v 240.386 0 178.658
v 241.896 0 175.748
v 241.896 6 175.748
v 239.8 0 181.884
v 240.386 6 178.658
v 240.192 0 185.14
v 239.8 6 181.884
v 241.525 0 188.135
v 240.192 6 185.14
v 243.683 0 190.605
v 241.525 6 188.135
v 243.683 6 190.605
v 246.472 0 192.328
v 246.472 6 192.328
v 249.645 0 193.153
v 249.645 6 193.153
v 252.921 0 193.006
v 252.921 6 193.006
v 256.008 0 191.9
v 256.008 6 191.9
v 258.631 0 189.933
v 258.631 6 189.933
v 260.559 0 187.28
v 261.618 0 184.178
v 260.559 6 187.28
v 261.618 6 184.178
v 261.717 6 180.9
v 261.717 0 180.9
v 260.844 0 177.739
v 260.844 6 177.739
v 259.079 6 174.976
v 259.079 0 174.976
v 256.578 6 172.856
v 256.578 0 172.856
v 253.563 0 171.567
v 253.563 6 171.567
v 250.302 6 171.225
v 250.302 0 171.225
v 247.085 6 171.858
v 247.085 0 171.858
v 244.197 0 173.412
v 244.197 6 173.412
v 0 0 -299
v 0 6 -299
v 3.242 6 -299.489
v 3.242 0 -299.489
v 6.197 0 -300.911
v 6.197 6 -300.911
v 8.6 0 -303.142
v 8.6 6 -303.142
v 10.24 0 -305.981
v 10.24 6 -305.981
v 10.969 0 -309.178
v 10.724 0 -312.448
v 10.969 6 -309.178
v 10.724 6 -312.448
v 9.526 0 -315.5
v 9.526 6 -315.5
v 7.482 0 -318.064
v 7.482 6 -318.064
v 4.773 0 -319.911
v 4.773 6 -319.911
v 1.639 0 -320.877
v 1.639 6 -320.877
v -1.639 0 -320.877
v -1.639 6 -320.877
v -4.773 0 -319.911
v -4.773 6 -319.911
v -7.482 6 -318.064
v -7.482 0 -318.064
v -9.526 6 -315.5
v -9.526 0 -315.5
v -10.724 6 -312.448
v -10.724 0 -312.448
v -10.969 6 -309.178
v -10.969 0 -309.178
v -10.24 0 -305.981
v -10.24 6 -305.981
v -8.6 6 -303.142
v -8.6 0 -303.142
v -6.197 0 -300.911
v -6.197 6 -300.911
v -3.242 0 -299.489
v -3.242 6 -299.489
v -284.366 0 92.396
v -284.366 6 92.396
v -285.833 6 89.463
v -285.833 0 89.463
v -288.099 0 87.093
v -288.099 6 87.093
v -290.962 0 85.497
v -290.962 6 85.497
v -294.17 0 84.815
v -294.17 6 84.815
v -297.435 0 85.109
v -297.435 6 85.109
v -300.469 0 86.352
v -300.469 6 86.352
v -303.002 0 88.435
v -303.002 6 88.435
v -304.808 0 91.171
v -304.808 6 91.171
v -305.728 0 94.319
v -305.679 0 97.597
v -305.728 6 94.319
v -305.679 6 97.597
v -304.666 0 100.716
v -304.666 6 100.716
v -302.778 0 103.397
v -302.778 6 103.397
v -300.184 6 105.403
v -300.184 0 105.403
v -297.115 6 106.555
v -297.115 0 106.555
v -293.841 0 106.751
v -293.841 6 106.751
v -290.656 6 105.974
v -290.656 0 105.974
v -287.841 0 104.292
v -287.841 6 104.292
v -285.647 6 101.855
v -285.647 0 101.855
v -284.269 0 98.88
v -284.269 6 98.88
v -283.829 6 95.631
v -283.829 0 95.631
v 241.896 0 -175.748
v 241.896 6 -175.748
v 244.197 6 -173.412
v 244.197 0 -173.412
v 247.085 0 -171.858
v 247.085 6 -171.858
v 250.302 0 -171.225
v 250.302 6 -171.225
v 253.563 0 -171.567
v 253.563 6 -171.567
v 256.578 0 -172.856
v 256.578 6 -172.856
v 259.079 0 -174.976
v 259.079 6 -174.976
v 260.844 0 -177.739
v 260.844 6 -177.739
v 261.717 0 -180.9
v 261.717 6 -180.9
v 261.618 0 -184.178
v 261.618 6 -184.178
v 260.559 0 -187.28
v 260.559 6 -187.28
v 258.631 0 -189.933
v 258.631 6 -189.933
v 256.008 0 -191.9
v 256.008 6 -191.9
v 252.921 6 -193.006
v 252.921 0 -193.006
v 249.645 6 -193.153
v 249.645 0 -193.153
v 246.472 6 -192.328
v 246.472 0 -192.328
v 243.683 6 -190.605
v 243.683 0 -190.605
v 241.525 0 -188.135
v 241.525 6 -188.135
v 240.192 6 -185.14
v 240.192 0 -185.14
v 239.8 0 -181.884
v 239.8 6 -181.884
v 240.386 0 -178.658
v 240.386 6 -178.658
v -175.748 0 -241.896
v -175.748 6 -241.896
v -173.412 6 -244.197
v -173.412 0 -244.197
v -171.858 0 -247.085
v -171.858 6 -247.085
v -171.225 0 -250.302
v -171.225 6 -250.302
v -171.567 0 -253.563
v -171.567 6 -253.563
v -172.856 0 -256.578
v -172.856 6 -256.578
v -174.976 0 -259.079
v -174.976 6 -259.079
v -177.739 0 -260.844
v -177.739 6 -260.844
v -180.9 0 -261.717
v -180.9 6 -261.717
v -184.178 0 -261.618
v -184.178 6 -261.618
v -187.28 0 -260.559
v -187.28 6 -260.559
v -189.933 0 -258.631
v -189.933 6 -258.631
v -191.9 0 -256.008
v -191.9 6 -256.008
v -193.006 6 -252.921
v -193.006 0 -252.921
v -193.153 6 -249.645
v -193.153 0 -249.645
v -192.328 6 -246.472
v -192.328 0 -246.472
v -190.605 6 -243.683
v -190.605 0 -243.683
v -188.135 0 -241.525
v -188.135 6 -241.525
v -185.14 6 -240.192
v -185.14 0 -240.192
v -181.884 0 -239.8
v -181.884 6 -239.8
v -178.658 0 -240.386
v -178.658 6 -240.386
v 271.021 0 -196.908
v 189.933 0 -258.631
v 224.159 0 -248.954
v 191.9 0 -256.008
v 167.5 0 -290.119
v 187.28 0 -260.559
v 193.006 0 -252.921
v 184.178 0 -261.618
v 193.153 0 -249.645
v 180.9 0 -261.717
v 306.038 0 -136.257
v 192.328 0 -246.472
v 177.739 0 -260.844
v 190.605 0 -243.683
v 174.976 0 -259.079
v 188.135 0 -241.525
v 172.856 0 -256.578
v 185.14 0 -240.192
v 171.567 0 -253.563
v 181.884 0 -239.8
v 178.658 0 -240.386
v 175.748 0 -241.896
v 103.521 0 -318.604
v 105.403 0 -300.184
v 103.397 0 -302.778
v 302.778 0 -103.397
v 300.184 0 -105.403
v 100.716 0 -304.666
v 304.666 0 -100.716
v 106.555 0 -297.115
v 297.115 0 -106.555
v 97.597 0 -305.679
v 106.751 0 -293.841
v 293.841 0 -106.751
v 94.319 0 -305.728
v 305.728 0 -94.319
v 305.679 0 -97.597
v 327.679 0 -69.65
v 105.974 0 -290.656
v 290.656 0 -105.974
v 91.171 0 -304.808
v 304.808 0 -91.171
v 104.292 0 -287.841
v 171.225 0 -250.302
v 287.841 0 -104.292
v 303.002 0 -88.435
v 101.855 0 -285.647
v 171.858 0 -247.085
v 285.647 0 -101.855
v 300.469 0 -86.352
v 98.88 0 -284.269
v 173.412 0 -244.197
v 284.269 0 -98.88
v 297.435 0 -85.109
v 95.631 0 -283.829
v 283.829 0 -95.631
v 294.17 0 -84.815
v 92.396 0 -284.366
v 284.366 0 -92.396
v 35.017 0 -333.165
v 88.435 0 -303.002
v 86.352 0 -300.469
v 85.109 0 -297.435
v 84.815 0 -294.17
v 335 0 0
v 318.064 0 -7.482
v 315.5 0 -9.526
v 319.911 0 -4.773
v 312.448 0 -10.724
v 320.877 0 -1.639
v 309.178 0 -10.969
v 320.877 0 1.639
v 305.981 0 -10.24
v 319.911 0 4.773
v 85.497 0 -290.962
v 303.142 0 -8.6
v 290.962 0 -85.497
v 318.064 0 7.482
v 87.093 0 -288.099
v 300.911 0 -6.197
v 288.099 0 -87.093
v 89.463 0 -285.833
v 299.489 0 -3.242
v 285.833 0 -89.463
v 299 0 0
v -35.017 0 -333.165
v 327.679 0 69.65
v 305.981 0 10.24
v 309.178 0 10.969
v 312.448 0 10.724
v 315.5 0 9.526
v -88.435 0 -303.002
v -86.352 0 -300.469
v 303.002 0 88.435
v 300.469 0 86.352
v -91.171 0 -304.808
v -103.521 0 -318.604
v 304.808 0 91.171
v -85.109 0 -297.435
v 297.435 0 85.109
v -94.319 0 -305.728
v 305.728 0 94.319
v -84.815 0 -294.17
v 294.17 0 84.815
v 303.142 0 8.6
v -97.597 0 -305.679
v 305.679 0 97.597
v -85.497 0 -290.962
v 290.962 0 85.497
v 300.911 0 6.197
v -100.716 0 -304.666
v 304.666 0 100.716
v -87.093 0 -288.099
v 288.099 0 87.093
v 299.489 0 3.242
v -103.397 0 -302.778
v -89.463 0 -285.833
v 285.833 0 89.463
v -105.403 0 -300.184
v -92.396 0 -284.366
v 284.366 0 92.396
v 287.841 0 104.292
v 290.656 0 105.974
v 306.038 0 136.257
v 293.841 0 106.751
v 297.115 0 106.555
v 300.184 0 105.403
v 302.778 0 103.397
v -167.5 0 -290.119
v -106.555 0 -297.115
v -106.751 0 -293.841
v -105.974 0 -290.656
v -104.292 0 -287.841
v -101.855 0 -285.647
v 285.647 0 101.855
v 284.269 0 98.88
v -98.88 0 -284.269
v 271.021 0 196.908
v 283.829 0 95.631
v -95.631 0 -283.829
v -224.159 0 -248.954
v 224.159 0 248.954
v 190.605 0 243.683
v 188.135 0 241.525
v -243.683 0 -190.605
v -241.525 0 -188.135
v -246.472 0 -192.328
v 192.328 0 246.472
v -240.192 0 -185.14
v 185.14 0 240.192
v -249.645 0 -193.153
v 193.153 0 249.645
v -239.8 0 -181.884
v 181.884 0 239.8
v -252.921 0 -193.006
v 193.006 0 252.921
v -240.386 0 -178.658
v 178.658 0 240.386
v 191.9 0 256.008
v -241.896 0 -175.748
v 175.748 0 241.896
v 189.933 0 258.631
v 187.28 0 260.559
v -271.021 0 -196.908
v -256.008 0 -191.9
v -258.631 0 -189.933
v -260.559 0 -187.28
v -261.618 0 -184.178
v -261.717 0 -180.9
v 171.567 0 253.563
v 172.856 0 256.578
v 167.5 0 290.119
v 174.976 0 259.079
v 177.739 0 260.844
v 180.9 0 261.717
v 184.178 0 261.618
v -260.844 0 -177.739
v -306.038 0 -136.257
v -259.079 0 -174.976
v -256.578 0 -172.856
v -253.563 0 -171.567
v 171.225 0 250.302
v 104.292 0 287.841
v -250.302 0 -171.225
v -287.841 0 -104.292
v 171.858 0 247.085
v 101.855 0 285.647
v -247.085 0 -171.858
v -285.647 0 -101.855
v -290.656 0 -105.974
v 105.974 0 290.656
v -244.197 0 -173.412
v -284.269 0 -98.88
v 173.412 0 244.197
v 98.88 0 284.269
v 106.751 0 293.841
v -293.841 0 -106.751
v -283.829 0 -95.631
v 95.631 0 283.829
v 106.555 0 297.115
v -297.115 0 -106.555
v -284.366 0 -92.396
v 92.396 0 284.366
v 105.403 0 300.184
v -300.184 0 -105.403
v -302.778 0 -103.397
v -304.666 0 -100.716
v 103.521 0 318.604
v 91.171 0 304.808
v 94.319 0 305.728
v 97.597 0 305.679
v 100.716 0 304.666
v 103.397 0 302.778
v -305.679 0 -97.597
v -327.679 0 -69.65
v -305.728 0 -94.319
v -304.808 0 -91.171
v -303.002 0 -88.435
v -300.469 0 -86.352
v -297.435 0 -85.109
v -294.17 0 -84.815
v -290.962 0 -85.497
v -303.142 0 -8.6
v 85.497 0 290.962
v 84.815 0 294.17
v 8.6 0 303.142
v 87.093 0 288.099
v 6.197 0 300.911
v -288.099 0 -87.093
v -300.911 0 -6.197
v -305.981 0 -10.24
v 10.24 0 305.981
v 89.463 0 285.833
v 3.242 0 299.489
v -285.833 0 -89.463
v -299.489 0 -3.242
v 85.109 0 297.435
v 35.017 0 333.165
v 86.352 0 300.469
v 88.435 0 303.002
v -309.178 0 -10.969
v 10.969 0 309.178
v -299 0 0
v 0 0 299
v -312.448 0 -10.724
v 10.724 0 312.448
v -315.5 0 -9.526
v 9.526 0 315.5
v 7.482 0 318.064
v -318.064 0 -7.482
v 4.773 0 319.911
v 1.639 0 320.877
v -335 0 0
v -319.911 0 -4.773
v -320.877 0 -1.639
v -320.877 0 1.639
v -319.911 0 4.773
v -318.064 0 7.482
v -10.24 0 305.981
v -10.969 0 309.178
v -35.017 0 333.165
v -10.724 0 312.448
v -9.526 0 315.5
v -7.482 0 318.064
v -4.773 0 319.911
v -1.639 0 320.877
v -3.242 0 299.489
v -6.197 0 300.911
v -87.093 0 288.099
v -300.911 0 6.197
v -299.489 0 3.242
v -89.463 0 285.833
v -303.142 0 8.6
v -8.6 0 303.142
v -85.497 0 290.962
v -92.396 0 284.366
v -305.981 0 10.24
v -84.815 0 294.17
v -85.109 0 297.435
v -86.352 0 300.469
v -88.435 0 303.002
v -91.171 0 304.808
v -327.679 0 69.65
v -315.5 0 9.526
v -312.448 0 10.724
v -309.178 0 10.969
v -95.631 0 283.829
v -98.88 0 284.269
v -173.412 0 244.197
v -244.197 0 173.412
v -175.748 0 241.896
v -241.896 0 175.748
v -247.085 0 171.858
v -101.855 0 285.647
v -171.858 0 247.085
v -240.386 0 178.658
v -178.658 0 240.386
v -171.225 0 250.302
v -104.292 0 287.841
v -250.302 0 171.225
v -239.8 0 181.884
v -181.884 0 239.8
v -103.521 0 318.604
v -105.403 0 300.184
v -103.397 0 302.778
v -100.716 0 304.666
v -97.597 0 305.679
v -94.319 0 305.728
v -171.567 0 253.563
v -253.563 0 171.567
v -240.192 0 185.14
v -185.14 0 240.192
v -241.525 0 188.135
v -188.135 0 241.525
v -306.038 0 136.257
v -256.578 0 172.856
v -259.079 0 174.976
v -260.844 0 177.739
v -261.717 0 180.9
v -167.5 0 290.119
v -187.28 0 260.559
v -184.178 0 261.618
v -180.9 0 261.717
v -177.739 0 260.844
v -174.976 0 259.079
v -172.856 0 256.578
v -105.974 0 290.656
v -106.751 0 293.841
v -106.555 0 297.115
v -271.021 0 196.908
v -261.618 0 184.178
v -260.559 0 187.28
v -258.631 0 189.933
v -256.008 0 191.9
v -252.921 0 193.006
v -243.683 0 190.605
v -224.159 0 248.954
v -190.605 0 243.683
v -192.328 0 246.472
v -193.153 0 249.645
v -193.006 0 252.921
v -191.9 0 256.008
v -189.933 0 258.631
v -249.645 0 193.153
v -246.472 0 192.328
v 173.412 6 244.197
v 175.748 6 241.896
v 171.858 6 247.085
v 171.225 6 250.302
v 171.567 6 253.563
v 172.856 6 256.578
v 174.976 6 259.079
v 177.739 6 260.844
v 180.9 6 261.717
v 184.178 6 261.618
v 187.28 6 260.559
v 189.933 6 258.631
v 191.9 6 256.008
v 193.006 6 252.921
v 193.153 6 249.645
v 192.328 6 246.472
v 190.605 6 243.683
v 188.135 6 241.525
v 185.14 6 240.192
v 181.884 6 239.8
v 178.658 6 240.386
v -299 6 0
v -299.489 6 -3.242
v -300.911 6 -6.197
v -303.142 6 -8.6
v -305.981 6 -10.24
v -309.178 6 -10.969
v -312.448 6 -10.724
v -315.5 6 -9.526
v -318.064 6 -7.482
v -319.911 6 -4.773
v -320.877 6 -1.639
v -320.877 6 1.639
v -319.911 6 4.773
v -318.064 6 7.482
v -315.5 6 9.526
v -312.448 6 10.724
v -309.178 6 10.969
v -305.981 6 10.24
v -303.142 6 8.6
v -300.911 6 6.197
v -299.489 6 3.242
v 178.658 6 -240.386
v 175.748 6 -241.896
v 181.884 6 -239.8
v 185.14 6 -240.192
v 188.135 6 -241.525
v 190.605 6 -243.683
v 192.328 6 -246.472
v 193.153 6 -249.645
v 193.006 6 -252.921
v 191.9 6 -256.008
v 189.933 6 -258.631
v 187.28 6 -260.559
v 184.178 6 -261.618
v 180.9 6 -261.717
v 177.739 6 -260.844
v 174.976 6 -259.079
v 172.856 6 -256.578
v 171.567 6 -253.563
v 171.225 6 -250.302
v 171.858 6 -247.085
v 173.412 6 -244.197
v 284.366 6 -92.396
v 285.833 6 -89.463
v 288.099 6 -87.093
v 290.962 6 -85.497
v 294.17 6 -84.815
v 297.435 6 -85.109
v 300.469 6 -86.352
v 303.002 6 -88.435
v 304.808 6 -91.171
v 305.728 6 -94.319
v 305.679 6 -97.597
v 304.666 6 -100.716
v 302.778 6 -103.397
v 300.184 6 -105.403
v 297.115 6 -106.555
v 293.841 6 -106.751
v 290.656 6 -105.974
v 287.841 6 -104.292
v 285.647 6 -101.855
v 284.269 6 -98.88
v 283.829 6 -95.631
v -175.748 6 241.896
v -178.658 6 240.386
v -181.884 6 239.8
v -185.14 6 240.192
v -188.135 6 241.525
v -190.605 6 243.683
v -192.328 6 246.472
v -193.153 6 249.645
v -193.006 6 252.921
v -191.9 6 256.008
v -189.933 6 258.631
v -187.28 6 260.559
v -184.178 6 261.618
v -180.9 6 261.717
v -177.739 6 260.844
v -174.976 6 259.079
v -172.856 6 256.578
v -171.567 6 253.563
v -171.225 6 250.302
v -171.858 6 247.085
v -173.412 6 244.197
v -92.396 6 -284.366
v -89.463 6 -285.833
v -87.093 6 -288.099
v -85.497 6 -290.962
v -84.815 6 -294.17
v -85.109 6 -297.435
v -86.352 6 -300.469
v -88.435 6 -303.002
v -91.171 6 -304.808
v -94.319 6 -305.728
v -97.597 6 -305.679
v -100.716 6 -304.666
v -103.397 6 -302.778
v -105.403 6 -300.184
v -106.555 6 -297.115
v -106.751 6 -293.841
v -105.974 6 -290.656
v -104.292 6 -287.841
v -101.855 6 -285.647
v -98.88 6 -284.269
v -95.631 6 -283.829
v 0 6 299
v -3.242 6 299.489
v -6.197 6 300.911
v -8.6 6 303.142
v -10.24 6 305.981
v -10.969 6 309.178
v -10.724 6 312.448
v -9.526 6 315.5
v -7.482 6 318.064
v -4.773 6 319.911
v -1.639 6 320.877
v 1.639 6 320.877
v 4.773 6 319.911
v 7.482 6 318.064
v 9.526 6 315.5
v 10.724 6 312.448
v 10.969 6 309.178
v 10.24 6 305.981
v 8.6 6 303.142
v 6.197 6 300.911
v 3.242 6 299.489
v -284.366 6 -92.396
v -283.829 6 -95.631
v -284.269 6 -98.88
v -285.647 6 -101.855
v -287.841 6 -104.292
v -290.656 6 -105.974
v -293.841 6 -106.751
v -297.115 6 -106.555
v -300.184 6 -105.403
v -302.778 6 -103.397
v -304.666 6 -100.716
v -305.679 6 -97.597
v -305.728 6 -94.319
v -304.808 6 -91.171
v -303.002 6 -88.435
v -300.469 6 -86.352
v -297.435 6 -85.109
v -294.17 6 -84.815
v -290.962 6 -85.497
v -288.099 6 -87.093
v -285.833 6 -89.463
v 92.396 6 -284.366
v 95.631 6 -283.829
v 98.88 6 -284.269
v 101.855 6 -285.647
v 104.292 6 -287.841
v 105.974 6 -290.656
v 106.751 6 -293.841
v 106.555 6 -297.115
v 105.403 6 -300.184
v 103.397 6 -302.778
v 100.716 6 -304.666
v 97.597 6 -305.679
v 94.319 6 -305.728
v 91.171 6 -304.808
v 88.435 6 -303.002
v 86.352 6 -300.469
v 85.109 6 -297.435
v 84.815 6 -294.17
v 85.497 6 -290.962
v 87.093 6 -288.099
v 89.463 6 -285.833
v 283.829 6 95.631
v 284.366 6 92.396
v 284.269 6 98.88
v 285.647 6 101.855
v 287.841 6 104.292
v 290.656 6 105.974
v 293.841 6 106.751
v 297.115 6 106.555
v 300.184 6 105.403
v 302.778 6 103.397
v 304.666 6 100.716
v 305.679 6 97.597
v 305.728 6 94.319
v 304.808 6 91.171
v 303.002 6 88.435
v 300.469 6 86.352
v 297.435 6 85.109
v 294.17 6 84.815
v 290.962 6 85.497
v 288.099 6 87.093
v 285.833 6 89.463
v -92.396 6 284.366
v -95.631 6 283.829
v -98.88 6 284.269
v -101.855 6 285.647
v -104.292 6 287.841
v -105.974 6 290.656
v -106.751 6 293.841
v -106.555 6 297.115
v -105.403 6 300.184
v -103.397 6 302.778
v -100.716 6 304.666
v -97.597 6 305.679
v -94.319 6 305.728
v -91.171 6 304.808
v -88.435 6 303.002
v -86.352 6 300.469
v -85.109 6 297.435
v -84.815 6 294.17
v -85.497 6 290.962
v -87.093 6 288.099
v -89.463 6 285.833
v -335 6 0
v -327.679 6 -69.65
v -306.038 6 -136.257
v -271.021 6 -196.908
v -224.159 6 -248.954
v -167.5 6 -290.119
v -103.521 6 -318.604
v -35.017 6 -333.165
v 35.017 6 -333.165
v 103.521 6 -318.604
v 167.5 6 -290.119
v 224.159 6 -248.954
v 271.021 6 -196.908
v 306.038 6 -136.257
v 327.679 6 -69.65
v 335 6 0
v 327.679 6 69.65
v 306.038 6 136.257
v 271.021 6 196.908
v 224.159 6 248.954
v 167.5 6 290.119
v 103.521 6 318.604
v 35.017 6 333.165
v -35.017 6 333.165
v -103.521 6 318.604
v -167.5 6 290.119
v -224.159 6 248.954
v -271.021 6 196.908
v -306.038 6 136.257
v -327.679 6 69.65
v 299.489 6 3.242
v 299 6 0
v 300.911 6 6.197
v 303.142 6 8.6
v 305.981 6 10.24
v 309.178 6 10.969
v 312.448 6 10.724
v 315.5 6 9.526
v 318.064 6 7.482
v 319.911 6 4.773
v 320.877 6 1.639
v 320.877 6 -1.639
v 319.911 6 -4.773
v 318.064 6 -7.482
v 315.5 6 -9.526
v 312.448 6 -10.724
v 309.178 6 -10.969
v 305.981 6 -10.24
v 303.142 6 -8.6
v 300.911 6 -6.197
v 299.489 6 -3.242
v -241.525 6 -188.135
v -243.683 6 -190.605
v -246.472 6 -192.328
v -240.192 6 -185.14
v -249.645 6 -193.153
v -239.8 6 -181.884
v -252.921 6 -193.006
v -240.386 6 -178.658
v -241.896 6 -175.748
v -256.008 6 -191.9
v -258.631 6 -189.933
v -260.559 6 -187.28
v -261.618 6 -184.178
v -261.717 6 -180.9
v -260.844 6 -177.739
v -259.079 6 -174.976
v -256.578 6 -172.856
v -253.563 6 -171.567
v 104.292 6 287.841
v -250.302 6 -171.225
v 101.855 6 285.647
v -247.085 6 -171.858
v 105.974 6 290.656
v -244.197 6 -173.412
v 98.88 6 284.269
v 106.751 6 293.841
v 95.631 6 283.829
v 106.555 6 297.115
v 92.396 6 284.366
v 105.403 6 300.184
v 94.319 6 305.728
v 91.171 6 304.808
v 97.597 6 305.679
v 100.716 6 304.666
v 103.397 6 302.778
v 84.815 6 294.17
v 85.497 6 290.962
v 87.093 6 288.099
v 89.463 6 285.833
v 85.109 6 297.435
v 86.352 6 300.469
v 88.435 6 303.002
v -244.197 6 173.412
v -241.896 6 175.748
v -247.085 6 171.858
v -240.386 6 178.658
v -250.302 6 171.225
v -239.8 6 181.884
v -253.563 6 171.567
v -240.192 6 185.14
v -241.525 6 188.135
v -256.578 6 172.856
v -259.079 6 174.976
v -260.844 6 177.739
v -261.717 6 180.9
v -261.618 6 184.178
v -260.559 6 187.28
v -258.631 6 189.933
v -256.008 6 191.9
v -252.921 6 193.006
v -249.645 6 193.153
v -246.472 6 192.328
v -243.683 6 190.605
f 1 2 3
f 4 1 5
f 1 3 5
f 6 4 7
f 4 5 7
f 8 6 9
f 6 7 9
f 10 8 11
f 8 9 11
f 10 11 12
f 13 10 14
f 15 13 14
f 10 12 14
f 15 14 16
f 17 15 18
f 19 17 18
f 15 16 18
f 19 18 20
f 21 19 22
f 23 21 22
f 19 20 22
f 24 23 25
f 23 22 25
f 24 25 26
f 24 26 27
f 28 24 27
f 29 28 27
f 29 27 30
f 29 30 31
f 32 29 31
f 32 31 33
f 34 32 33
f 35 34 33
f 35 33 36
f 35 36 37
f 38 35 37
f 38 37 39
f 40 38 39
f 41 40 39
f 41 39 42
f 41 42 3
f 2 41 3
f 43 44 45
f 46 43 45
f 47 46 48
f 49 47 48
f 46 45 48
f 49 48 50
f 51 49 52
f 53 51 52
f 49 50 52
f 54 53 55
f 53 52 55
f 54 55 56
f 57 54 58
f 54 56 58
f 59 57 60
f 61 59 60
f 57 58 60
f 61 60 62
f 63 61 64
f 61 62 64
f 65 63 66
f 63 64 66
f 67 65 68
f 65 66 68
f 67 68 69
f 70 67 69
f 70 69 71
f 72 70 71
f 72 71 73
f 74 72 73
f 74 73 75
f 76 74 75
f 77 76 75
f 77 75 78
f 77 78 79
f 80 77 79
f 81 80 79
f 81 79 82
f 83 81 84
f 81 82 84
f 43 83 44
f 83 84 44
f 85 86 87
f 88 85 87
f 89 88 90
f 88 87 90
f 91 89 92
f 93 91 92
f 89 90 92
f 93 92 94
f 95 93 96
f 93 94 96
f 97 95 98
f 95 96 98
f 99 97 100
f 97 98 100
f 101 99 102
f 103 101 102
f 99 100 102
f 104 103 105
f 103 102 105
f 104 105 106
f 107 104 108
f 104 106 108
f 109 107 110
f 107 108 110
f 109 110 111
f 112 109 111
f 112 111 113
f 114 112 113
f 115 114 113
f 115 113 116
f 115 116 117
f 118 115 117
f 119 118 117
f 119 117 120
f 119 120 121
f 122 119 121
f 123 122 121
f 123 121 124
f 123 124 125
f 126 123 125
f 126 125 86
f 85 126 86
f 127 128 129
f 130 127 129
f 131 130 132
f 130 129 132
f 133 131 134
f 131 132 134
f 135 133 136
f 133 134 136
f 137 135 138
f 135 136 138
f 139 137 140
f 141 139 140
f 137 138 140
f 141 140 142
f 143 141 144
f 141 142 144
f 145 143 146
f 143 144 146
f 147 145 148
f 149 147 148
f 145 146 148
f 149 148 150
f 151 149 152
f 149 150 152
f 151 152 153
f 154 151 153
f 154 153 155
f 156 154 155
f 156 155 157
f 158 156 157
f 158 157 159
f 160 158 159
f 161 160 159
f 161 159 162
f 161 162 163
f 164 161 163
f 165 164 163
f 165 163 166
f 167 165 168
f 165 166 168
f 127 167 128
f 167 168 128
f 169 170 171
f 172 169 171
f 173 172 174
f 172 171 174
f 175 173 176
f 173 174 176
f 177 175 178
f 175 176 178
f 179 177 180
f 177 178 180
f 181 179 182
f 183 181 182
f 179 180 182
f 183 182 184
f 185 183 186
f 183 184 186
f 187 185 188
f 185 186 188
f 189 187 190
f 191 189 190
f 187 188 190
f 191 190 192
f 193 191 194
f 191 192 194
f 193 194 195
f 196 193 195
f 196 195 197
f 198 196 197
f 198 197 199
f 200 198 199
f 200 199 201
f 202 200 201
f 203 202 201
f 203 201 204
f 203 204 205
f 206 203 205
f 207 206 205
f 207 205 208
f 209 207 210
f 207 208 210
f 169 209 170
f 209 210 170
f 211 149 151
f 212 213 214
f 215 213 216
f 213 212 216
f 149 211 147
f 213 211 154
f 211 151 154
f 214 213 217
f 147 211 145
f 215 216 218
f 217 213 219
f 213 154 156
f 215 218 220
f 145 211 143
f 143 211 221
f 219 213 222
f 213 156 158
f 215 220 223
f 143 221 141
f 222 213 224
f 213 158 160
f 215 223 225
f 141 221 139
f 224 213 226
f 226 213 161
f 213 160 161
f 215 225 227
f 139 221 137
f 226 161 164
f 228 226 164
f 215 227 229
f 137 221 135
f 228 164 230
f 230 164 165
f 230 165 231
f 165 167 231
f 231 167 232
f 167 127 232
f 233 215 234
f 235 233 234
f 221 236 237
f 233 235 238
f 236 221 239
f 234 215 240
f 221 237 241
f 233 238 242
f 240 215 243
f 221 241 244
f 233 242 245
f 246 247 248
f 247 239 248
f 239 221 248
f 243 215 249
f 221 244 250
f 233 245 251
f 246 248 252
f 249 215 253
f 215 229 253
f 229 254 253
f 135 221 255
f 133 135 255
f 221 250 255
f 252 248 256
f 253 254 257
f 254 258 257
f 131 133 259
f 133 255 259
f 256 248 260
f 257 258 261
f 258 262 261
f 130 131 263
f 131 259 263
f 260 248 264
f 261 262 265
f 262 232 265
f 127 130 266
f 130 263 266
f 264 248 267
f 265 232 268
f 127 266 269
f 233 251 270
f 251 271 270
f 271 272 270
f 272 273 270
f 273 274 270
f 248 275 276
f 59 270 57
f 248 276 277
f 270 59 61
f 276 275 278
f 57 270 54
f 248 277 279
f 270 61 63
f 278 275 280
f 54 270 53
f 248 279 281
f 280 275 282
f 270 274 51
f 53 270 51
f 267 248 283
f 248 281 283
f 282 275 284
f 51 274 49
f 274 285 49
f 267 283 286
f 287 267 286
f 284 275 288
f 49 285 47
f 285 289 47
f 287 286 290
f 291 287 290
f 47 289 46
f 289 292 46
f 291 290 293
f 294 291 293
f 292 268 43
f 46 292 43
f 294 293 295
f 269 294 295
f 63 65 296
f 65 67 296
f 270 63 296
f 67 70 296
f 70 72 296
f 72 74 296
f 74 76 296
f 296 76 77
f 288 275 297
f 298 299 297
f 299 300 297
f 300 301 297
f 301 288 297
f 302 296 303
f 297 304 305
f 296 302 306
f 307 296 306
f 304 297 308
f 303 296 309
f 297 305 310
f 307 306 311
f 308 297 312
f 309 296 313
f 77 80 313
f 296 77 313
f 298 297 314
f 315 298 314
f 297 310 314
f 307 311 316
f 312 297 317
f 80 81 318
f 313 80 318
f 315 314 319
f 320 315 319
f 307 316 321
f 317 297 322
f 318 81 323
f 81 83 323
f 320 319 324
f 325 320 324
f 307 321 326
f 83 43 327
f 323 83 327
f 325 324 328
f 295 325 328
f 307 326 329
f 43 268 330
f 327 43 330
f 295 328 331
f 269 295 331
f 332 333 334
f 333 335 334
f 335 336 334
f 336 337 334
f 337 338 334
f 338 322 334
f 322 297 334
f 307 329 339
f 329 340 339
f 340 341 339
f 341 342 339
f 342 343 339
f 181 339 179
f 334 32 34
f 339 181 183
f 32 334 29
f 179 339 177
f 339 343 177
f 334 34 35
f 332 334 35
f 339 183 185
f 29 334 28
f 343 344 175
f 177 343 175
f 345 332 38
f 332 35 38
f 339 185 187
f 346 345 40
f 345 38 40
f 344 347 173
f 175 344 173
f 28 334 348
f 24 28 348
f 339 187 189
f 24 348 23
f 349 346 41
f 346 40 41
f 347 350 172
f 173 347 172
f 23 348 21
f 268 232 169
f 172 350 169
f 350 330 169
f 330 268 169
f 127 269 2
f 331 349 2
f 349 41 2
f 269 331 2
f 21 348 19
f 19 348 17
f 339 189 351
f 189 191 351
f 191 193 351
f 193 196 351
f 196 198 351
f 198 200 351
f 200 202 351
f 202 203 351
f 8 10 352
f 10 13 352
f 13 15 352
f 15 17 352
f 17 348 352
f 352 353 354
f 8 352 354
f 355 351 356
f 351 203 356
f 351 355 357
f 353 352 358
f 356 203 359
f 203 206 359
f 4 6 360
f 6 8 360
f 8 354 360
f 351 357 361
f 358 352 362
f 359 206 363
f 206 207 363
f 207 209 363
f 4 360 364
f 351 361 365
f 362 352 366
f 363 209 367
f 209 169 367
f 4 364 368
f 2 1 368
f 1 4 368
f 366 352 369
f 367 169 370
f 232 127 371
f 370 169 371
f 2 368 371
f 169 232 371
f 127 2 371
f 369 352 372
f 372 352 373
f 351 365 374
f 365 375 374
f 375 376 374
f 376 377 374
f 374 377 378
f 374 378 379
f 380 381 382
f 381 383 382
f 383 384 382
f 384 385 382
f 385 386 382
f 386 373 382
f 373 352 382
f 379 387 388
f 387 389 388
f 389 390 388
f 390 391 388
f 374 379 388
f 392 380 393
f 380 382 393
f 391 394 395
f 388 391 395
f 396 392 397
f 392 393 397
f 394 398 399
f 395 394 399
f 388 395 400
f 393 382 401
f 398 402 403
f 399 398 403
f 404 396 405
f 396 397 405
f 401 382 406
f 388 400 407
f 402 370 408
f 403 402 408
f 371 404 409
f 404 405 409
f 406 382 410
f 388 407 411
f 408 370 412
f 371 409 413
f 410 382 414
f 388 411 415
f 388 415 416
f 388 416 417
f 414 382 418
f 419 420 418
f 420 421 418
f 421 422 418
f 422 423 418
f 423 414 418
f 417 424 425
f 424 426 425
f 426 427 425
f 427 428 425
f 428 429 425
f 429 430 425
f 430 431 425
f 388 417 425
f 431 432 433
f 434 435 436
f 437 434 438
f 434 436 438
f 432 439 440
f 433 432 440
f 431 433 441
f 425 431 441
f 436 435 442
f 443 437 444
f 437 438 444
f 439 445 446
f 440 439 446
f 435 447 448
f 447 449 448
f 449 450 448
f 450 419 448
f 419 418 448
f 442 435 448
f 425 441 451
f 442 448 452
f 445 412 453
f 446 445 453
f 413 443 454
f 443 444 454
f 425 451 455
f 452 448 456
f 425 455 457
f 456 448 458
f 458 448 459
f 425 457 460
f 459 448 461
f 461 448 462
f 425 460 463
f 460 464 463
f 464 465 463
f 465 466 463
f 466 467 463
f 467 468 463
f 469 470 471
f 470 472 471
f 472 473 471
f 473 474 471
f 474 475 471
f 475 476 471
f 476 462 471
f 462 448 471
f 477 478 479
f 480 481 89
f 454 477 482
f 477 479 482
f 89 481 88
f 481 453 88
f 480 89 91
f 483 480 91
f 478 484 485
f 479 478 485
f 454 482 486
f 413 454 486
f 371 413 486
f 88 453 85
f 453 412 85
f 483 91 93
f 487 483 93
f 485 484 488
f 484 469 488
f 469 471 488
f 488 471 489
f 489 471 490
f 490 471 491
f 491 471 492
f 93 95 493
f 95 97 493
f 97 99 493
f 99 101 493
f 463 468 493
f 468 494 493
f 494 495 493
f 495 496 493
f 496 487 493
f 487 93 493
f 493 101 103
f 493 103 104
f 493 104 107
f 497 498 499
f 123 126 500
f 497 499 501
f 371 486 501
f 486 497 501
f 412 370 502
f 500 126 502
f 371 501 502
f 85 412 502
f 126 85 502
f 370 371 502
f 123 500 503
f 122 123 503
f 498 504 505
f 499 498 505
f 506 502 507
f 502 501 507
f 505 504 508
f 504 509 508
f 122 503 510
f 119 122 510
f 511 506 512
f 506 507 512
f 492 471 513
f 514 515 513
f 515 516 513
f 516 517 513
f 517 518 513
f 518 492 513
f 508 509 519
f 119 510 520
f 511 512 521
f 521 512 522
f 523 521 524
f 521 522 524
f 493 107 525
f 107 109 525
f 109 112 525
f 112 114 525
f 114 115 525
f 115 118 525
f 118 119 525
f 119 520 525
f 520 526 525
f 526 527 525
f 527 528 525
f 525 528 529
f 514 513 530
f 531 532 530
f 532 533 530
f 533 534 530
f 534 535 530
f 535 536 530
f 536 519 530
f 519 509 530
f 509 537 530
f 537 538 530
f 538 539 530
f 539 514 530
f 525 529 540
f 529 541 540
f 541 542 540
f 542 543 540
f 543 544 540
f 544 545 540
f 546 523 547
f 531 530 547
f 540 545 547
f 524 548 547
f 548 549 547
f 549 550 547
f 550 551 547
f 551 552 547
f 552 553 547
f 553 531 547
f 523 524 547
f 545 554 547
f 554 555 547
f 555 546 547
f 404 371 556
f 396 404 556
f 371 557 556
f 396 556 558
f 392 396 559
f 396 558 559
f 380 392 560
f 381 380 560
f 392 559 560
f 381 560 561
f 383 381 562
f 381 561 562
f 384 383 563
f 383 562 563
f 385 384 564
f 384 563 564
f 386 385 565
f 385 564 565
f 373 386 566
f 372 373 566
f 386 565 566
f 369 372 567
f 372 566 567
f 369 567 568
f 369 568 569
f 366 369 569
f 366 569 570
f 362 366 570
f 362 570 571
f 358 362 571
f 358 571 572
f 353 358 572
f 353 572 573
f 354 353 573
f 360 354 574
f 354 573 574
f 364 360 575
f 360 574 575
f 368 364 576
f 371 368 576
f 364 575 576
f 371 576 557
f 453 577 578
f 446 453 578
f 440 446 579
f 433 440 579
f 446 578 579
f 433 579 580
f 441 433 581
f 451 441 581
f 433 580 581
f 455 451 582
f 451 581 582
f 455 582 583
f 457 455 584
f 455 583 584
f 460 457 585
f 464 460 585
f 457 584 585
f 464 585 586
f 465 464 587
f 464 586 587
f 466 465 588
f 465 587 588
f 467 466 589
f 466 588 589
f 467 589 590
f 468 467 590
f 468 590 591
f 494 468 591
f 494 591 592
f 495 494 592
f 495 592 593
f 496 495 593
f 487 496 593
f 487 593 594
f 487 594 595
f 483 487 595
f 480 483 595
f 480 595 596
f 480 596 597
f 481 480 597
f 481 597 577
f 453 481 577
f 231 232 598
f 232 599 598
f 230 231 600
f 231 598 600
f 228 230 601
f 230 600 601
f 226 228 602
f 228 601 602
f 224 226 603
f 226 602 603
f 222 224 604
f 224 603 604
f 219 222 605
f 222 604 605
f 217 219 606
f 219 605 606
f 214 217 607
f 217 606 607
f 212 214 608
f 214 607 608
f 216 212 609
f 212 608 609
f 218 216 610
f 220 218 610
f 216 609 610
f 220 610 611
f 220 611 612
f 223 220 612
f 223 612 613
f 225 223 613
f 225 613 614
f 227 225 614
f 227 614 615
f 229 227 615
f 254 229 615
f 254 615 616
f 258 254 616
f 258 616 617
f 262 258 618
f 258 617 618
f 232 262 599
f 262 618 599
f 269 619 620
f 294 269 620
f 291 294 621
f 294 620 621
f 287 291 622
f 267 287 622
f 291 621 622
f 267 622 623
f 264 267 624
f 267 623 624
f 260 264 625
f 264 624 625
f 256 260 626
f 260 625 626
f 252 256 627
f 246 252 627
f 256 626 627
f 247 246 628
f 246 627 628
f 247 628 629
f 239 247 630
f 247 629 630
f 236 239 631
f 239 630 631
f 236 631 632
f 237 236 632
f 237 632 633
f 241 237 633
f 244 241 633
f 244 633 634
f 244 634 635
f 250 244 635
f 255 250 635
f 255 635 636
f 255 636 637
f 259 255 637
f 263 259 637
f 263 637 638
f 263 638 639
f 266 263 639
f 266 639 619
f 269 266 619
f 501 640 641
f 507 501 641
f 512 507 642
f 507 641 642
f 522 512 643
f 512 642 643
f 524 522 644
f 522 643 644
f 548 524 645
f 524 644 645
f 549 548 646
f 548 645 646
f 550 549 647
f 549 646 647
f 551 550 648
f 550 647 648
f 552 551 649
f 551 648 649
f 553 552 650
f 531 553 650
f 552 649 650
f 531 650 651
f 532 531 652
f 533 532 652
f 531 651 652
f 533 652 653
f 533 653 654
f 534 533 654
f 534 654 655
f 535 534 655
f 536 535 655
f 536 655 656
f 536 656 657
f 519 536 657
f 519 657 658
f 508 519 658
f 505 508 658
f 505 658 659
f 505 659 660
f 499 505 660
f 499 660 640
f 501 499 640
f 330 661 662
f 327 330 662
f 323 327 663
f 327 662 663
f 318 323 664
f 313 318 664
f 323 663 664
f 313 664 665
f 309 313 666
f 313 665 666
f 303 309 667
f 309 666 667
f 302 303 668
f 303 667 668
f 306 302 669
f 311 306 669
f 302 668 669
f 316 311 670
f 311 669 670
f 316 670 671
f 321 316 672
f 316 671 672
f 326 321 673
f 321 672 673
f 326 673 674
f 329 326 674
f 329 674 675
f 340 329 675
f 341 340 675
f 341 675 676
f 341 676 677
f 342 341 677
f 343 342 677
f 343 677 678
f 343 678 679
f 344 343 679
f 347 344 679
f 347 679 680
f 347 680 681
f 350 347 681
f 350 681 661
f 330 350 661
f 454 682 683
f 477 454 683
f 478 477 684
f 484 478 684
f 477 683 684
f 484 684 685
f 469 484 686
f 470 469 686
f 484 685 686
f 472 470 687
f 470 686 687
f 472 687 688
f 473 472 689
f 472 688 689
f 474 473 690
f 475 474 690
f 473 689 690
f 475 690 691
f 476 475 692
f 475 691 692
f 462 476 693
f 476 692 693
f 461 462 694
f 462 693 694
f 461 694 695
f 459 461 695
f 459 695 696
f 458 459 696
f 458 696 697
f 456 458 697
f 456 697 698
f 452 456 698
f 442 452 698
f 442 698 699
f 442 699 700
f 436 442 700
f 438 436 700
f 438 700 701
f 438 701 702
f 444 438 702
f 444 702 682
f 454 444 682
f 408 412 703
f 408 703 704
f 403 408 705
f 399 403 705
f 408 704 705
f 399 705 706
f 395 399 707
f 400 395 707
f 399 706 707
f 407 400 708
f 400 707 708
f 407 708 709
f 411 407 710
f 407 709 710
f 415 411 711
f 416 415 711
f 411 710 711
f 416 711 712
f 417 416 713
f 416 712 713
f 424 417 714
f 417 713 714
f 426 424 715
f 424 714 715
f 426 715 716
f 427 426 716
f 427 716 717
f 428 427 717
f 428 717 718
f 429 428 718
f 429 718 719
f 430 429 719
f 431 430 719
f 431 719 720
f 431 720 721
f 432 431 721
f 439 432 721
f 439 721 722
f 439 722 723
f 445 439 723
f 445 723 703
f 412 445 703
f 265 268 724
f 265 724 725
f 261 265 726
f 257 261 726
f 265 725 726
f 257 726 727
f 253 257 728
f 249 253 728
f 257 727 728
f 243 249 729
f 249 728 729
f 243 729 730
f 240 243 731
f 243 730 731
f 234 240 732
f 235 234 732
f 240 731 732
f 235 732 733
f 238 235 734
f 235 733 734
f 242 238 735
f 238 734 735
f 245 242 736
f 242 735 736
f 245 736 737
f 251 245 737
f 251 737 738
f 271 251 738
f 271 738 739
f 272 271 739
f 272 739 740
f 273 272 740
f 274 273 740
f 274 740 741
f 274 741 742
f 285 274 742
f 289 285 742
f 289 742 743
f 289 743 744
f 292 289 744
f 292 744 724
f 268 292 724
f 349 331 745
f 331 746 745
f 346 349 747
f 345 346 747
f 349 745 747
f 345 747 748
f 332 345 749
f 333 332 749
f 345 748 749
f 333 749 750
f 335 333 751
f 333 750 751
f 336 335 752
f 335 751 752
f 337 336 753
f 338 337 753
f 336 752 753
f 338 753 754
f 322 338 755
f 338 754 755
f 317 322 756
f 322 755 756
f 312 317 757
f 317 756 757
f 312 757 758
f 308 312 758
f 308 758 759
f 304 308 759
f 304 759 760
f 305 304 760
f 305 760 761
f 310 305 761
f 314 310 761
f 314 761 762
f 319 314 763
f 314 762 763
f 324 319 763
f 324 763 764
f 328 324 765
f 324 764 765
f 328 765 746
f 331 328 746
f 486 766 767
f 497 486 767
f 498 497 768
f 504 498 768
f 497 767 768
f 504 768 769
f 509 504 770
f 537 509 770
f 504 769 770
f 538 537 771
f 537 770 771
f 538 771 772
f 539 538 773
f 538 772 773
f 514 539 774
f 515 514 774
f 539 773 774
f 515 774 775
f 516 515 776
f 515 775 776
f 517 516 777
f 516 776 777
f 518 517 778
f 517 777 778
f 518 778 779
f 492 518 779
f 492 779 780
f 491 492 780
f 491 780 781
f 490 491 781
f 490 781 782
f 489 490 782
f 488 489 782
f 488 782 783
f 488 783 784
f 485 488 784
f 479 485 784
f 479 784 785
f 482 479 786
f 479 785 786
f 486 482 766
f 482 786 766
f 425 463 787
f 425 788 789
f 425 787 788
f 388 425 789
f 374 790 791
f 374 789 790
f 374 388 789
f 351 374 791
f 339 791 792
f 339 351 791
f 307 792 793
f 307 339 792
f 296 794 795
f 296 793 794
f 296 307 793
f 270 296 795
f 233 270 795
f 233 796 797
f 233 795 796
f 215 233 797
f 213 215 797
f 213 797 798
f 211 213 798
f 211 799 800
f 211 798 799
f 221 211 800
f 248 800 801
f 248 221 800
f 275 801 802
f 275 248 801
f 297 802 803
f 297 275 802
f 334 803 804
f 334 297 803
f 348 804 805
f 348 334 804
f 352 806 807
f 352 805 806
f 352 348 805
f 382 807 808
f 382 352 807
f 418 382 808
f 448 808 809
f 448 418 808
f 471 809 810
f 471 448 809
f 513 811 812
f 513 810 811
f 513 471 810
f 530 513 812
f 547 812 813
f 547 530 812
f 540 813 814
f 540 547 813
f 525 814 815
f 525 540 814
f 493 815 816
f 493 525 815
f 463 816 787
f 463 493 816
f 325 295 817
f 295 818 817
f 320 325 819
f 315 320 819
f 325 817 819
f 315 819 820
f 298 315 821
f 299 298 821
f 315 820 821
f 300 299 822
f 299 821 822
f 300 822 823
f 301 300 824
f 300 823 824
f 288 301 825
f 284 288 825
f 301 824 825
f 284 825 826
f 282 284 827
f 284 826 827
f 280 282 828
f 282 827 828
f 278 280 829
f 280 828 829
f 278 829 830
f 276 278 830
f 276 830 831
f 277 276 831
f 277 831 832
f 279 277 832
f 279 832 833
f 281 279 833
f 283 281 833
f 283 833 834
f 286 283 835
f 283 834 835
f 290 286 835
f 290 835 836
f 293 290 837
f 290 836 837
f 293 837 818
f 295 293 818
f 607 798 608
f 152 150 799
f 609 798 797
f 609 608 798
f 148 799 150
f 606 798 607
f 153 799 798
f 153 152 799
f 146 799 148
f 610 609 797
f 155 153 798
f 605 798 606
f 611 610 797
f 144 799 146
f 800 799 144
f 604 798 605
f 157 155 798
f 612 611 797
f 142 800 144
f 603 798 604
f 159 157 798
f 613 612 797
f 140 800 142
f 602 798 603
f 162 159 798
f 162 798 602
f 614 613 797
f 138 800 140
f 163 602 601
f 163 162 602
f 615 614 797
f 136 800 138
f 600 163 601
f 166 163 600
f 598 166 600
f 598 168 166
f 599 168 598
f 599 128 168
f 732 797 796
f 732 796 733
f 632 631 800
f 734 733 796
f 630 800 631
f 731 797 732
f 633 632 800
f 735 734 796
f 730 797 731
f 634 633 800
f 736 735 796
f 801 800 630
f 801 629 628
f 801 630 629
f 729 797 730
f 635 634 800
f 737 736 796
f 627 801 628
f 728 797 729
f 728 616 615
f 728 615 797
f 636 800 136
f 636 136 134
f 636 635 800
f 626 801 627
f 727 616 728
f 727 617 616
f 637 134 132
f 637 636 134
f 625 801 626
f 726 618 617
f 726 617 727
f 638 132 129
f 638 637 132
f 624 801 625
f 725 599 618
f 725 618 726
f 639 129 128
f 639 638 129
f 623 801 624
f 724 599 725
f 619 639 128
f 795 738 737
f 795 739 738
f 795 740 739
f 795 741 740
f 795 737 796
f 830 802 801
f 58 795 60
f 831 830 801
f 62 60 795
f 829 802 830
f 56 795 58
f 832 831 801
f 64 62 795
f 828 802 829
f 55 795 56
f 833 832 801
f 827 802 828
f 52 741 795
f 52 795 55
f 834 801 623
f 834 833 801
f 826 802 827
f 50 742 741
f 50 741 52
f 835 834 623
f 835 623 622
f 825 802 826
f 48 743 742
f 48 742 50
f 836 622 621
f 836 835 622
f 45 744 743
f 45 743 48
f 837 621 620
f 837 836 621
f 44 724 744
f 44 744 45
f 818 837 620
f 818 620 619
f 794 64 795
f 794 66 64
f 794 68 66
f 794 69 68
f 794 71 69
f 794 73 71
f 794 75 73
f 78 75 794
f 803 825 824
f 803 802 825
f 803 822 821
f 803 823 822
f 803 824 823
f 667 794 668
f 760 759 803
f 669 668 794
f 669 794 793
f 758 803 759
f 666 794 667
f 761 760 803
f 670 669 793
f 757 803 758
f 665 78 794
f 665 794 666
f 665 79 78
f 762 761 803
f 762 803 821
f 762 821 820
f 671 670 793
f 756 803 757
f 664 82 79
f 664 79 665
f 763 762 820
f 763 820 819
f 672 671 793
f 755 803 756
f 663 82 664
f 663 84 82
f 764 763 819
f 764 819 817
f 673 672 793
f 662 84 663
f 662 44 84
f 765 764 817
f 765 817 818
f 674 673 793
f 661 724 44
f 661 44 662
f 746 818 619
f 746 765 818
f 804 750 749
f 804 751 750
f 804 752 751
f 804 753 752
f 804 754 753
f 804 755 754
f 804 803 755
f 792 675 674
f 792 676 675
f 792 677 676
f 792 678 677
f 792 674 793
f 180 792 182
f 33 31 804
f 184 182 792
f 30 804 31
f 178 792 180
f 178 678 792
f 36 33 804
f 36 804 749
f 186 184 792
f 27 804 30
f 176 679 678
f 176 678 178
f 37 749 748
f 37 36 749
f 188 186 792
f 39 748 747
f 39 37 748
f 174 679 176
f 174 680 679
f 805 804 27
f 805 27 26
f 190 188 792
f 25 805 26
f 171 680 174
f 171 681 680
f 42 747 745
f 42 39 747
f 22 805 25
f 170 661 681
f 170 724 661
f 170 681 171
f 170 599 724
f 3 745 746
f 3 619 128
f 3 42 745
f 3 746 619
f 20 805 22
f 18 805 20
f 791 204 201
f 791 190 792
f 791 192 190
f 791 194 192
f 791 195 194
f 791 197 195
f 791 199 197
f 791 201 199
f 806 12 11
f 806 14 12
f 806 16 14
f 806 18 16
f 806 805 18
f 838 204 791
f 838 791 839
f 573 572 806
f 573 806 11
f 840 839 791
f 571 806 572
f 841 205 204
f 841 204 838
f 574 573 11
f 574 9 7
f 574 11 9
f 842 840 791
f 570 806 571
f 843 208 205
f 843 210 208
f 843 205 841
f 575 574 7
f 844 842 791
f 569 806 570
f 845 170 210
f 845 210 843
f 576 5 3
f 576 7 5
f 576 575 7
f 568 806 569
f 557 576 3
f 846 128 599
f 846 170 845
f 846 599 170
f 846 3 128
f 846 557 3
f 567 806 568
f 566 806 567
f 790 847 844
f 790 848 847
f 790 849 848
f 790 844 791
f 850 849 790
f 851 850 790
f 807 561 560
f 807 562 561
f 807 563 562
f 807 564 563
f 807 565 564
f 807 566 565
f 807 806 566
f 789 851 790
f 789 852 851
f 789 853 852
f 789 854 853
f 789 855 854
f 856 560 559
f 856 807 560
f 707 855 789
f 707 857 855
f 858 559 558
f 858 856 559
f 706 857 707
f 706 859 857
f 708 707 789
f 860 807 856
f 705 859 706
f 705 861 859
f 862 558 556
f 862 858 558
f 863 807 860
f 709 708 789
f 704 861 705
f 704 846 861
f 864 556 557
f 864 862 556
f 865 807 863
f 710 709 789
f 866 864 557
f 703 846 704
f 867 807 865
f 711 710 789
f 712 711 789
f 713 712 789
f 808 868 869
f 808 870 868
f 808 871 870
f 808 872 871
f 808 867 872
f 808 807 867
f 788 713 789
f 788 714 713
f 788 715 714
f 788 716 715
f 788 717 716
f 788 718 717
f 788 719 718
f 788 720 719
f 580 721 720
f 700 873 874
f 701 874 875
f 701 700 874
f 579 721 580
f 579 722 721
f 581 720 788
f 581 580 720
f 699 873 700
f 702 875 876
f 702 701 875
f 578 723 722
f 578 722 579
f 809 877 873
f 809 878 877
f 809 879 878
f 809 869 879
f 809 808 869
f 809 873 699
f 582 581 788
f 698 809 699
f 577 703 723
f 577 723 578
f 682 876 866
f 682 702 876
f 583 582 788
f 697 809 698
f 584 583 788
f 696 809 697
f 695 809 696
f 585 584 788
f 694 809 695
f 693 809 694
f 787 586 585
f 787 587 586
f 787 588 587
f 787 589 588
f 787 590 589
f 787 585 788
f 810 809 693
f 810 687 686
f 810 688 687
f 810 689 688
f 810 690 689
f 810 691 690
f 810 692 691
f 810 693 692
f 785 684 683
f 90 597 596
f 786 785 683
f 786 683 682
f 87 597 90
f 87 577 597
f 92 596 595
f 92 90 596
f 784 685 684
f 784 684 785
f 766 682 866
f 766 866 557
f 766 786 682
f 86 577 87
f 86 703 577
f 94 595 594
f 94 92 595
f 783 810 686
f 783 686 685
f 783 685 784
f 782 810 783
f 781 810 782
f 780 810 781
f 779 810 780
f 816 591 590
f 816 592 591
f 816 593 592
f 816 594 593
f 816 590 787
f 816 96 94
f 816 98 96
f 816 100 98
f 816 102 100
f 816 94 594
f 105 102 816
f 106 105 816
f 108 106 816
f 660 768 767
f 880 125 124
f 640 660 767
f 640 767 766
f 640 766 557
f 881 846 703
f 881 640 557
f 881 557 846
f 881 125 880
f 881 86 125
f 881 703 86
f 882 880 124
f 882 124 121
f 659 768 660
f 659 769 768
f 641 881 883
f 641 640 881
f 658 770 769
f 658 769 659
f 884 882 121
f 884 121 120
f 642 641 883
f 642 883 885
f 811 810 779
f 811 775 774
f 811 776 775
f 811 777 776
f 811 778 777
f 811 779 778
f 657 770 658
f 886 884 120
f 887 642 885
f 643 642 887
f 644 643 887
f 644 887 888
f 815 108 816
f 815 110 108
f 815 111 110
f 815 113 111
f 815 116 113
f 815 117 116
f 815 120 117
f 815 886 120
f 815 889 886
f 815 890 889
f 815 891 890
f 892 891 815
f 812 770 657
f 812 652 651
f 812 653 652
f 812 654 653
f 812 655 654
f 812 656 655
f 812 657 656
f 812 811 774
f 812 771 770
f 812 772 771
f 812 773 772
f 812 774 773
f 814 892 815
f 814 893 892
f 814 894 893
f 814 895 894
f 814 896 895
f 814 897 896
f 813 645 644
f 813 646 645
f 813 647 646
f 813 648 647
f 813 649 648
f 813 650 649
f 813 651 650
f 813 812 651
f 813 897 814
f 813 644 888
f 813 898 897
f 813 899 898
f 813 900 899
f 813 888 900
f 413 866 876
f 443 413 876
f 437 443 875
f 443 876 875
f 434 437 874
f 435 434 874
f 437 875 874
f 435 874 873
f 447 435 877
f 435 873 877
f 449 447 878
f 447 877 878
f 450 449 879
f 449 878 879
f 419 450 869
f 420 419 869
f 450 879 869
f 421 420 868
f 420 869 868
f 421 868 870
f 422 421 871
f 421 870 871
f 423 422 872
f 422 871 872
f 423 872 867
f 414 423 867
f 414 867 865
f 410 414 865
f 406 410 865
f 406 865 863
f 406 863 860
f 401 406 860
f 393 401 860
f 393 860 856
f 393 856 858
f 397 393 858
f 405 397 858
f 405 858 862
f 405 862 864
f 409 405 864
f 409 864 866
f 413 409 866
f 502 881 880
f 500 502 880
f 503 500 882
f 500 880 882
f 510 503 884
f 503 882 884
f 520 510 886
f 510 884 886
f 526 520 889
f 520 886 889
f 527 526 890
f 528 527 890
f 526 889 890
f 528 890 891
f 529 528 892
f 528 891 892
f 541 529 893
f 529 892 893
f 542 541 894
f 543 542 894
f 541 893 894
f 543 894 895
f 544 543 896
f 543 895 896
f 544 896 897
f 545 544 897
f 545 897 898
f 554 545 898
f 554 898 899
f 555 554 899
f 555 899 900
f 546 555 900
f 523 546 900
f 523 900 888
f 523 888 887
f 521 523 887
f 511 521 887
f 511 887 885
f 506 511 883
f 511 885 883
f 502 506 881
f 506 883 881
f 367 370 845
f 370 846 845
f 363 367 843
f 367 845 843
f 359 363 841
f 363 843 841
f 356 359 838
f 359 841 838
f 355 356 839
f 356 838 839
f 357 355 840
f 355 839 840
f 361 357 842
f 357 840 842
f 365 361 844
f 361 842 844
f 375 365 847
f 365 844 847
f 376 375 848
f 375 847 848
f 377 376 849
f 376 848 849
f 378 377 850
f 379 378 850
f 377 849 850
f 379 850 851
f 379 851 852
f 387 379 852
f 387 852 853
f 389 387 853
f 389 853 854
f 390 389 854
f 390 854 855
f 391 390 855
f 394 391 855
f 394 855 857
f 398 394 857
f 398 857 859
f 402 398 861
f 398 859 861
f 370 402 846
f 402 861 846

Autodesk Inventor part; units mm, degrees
ref_plane "YZ Plane" through (0, 0, 0) normal (1, 0, 0) x (0, 1, 0)
ref_plane "XZ Plane" through (0, 0, 0) normal (0, 1, 0) x (-1, 0, 0)
ref_plane "XY Plane" through (0, 0, 0) normal (0, 0, 1) x (1, 0, 0)
sketch "Sketch1" plane through (0, 0, 0) normal (0, 1, 0) x (-1, 0, 0)
  circle A0 centre (0, 0) radius 335
  dimension "d0" = 670
extrude "Extrusion1" add sketch "Sketch1" along normal blind 6
sketch "Sketch2" plane through (0, 6, 0) normal (0, 1, 0) x (1, 0, 0)
  circle A0 centre (-310, 0) radius 11
  circle A1 centre (0, 0) radius 310 construction
  dimension "d4" = 620
  dimension "d3" = 22
extrude "Cut1" cut sketch "Sketch2" against normal blind 6
pattern_circular "Circular Pattern1" count 20 over 360 about axis through (0, 0, 0) along (0, 1, 0) of "Cut1"
equation "\"d6\" = Thickness"
equation "\"BendRadius\" = Thickness"
equation "\"BendReliefWidth\" = Thickness"
equation "\"BendReliefDepth\" = 0.5 * Thickness"
equation "\"CornerReliefSize\" = 4 * Thickness"
equation "\"MinimumRemnant\" = 2 * Thickness"
equation "\"TransitionRadius\" = BendRadius"
equation "\"JacobiRadiusSize\" = BendRadius"
equation "\"GapSize\" = Thickness"
equation "\"d5\" = Thickness"
equation "\"Thickness\" = 6"
properties part number "PNS-721 charging hatch D1200"
